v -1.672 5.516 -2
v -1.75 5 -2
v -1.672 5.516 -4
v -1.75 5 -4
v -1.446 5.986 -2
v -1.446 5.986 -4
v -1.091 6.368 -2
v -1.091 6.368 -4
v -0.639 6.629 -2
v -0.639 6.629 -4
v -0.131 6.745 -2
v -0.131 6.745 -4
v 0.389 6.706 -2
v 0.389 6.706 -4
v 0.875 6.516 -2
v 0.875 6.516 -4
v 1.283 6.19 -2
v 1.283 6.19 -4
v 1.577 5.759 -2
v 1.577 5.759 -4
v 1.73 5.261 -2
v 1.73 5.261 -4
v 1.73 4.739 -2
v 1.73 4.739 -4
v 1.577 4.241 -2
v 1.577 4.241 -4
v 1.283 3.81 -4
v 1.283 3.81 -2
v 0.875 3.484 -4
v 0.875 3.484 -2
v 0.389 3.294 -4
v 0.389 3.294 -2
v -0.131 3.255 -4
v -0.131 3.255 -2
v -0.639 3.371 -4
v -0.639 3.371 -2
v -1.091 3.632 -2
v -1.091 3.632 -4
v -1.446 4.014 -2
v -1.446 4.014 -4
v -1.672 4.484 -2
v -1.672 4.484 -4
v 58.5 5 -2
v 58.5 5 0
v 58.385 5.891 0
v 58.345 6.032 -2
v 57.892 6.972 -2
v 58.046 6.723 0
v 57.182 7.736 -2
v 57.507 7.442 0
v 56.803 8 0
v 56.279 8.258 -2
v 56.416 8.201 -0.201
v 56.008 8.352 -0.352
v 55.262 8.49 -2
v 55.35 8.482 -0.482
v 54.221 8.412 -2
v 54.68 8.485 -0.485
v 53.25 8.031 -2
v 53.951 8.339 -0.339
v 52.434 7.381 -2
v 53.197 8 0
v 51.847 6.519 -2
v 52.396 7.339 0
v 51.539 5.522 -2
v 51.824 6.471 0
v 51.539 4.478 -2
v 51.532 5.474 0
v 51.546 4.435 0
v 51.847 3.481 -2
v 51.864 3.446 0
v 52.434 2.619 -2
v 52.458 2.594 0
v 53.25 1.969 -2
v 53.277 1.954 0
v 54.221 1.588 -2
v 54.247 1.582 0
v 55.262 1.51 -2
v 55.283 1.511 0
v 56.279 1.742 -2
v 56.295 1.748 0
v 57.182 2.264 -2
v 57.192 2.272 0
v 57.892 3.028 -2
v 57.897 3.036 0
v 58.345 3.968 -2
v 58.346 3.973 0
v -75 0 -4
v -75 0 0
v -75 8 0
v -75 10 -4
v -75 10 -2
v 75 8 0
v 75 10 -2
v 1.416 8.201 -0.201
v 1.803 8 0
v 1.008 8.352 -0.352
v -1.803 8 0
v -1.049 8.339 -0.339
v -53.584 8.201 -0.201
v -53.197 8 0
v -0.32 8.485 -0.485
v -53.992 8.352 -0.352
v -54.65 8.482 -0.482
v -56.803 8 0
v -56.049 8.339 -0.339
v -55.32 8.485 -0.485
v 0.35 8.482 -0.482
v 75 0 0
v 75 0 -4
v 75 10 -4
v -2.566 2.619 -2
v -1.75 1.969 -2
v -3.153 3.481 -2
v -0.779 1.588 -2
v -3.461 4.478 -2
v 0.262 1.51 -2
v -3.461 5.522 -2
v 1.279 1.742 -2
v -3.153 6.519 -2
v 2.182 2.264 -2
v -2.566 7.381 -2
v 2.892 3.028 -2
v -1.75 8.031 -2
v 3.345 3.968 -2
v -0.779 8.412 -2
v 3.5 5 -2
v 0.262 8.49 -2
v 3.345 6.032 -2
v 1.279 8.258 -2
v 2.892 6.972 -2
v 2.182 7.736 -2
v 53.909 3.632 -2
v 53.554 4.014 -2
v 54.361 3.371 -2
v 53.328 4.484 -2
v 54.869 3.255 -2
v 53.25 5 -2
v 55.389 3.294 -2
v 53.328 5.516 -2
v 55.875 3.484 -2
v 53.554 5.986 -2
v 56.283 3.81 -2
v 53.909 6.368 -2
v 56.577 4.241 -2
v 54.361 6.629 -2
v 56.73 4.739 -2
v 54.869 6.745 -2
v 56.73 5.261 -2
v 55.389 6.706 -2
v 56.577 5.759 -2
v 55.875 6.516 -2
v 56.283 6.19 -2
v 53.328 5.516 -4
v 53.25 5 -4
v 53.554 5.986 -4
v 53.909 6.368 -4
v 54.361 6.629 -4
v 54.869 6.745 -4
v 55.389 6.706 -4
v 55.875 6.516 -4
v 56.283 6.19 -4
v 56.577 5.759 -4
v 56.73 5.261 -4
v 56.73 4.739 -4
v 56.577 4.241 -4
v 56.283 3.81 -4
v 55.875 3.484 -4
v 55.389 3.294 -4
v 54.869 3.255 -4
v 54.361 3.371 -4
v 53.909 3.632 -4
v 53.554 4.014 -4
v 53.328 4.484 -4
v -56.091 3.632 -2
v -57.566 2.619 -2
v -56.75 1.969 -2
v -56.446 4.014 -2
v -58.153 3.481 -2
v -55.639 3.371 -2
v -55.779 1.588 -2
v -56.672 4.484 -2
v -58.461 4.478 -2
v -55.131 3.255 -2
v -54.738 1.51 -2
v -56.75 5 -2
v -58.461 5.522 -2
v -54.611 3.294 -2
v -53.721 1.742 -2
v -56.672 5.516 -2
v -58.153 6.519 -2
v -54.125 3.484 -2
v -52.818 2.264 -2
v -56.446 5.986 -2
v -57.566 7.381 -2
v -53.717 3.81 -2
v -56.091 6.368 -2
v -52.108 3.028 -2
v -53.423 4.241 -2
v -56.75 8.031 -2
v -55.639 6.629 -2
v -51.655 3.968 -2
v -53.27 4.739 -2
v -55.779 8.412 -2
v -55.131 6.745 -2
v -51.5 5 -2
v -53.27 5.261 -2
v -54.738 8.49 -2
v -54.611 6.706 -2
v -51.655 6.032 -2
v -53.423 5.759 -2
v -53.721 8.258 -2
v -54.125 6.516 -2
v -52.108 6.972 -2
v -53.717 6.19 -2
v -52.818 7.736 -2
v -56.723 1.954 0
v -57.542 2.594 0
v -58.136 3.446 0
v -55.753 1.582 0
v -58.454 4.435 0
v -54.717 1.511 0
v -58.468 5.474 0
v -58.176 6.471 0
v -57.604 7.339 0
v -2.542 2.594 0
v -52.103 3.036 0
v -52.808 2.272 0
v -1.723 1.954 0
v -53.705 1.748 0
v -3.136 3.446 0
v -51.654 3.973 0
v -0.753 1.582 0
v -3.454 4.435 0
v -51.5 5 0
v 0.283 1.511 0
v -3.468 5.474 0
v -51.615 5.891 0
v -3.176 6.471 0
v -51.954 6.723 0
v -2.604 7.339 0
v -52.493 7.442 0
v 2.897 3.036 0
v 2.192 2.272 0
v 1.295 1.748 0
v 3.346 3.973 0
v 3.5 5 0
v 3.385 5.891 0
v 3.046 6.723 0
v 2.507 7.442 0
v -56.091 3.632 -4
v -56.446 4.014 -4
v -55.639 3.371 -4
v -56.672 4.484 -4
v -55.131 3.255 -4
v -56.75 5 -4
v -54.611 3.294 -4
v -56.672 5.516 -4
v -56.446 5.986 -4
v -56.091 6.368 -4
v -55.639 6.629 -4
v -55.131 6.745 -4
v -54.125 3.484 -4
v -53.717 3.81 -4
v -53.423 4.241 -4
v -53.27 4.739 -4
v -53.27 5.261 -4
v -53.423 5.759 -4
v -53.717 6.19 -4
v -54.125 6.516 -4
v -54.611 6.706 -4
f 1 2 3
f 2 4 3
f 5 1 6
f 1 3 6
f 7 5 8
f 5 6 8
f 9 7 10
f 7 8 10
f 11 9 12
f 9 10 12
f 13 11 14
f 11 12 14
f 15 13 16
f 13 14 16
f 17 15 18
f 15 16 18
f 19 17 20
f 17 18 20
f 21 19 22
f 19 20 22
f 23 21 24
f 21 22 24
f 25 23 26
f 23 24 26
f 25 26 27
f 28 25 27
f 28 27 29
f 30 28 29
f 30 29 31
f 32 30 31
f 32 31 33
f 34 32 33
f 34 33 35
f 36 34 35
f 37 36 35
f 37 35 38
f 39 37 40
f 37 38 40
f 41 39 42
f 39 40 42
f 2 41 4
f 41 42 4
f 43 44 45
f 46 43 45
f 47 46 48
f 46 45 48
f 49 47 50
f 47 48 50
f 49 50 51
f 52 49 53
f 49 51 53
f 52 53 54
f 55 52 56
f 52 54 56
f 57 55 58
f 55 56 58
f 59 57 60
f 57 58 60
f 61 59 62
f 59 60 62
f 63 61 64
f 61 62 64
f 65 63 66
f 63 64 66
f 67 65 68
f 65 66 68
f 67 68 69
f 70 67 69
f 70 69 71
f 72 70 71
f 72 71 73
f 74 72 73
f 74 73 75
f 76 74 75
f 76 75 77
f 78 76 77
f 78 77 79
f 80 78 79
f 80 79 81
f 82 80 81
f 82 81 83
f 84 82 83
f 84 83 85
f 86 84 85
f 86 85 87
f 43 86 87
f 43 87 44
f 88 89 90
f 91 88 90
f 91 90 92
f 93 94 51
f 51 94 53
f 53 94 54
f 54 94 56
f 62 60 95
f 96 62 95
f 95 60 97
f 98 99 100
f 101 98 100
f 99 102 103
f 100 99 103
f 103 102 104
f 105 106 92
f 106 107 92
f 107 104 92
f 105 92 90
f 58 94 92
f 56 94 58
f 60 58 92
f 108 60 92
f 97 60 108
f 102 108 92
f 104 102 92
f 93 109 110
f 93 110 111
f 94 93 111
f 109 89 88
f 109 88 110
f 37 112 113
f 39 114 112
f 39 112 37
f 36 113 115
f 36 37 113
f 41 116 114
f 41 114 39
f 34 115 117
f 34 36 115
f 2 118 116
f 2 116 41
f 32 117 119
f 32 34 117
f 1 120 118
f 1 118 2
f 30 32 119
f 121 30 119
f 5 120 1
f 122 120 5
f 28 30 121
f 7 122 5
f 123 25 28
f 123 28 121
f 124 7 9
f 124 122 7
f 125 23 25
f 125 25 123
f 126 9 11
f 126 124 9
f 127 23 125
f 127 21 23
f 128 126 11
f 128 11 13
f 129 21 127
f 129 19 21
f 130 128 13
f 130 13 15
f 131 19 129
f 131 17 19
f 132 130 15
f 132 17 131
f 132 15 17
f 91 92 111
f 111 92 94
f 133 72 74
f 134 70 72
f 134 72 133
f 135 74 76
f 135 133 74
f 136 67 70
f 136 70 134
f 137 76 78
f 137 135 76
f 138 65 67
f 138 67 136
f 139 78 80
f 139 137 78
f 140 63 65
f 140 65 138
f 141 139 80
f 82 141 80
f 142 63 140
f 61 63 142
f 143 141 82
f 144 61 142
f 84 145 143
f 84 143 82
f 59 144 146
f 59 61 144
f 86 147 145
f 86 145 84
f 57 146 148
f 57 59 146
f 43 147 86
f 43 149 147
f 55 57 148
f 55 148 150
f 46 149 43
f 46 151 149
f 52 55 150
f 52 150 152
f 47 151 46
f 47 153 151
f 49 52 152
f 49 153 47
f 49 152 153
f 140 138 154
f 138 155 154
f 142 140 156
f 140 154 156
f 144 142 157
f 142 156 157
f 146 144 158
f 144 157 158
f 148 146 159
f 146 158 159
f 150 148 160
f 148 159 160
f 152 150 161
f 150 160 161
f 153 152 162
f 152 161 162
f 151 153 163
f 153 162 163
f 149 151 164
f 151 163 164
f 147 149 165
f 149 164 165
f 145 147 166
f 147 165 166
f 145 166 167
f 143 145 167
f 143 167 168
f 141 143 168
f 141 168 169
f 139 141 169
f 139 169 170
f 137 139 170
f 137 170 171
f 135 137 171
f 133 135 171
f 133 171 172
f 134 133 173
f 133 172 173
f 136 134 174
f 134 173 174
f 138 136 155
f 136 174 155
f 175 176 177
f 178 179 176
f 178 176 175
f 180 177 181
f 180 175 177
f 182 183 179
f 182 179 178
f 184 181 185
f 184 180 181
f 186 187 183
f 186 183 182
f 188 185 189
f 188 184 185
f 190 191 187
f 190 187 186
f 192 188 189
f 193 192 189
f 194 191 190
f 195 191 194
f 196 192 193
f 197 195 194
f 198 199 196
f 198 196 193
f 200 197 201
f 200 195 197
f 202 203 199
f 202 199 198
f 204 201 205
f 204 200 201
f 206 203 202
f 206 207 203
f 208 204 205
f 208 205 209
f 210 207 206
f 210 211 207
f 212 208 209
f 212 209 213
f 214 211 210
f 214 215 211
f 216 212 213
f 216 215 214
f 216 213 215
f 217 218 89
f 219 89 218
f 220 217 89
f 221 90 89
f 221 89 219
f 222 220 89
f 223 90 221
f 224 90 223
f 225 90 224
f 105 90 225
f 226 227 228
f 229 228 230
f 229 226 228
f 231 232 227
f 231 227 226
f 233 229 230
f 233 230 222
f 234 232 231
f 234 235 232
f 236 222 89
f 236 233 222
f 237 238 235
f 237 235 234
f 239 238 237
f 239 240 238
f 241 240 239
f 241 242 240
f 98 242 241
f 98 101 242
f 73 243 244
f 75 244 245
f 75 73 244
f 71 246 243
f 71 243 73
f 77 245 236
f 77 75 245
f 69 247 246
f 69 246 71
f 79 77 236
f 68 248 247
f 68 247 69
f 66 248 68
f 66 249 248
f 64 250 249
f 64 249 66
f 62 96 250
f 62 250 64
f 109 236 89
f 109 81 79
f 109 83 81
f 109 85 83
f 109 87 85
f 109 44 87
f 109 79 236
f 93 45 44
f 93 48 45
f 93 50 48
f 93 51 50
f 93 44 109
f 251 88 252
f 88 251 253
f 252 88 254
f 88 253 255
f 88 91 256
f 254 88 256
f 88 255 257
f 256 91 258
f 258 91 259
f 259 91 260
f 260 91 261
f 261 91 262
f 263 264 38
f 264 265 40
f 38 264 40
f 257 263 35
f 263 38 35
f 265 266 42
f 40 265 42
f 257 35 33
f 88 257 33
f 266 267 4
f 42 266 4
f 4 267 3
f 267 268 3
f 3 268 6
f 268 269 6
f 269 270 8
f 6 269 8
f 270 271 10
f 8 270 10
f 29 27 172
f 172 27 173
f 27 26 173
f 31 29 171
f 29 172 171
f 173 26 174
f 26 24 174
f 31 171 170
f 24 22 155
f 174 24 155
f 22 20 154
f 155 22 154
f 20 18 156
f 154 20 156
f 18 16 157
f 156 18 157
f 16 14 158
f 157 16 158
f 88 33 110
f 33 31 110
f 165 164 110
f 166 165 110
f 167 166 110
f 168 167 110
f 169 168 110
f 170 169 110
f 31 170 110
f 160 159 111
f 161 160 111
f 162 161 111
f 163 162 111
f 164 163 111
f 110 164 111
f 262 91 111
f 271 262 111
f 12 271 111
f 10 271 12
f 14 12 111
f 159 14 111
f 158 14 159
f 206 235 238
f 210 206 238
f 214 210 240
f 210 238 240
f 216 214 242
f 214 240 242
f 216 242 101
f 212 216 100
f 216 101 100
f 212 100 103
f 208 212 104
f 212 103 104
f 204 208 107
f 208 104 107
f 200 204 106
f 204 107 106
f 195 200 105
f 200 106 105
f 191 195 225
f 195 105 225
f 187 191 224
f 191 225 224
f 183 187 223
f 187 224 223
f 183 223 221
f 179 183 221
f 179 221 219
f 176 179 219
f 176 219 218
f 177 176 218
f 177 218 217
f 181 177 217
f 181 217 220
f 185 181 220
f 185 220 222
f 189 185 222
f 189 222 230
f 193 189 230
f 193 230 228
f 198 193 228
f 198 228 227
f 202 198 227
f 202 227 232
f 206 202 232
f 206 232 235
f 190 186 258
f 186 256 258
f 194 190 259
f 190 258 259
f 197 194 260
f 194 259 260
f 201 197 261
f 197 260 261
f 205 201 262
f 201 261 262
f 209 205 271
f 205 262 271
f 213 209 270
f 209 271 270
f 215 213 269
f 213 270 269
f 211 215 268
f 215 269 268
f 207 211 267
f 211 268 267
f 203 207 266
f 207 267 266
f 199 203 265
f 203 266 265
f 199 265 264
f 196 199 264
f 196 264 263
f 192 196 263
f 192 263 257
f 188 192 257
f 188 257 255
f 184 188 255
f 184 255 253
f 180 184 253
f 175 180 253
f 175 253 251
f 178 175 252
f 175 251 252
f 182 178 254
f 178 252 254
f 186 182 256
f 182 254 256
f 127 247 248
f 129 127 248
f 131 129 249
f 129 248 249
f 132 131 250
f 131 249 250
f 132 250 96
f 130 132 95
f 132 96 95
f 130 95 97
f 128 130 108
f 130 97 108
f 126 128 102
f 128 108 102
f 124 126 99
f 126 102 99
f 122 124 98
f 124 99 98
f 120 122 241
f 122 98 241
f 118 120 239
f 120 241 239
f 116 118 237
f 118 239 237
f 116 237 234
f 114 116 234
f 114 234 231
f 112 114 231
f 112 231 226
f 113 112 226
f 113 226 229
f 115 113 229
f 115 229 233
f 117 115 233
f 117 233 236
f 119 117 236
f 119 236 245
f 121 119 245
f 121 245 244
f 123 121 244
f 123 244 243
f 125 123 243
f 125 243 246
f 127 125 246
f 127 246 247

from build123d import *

# Parameters (mm, degrees)
F0_W           = 150
F0_H           = 10
F1_DEPTH       = 4
F2_D           = 3.5
F2_CBORE_D     = 7
F2_CBORE_DEPTH = 2
F3_T1_DEPTH    = 160.2867319519


# Not quite as in the source:
# - a fillet or chamfer that OpenCascade refuses, or shapes differently, is made with other operations: its cross-section is extruded or revolved along the edge and cut away or added


with BuildPart() as f1:
    # F0 (on Top) → F1 (new body)
    with BuildSketch(Plane.XY):
        with Locations((0, 5)):
            Rectangle(F0_W, F0_H)
    extrude(amount=-F1_DEPTH)

    # F2 (through all)
    with Locations(Plane.XY):
        with Locations((-55, 5), (0, 5), (55, 5)):
            CounterBoreHole(F2_D / 2, F2_CBORE_D / 2, F2_CBORE_DEPTH)

    # F3: chamfer of 2 on 1 edges, made by hand

    # F3_s2 → F3_t1 (cut)
    with BuildSketch(Plane.YZ.offset(-80.1433659759)):
        Polygon((10, -2), (8, 0), (10, 0), align=None)
    extrude(amount=F3_T1_DEPTH, mode=Mode.SUBTRACT)


solid = f1.part
